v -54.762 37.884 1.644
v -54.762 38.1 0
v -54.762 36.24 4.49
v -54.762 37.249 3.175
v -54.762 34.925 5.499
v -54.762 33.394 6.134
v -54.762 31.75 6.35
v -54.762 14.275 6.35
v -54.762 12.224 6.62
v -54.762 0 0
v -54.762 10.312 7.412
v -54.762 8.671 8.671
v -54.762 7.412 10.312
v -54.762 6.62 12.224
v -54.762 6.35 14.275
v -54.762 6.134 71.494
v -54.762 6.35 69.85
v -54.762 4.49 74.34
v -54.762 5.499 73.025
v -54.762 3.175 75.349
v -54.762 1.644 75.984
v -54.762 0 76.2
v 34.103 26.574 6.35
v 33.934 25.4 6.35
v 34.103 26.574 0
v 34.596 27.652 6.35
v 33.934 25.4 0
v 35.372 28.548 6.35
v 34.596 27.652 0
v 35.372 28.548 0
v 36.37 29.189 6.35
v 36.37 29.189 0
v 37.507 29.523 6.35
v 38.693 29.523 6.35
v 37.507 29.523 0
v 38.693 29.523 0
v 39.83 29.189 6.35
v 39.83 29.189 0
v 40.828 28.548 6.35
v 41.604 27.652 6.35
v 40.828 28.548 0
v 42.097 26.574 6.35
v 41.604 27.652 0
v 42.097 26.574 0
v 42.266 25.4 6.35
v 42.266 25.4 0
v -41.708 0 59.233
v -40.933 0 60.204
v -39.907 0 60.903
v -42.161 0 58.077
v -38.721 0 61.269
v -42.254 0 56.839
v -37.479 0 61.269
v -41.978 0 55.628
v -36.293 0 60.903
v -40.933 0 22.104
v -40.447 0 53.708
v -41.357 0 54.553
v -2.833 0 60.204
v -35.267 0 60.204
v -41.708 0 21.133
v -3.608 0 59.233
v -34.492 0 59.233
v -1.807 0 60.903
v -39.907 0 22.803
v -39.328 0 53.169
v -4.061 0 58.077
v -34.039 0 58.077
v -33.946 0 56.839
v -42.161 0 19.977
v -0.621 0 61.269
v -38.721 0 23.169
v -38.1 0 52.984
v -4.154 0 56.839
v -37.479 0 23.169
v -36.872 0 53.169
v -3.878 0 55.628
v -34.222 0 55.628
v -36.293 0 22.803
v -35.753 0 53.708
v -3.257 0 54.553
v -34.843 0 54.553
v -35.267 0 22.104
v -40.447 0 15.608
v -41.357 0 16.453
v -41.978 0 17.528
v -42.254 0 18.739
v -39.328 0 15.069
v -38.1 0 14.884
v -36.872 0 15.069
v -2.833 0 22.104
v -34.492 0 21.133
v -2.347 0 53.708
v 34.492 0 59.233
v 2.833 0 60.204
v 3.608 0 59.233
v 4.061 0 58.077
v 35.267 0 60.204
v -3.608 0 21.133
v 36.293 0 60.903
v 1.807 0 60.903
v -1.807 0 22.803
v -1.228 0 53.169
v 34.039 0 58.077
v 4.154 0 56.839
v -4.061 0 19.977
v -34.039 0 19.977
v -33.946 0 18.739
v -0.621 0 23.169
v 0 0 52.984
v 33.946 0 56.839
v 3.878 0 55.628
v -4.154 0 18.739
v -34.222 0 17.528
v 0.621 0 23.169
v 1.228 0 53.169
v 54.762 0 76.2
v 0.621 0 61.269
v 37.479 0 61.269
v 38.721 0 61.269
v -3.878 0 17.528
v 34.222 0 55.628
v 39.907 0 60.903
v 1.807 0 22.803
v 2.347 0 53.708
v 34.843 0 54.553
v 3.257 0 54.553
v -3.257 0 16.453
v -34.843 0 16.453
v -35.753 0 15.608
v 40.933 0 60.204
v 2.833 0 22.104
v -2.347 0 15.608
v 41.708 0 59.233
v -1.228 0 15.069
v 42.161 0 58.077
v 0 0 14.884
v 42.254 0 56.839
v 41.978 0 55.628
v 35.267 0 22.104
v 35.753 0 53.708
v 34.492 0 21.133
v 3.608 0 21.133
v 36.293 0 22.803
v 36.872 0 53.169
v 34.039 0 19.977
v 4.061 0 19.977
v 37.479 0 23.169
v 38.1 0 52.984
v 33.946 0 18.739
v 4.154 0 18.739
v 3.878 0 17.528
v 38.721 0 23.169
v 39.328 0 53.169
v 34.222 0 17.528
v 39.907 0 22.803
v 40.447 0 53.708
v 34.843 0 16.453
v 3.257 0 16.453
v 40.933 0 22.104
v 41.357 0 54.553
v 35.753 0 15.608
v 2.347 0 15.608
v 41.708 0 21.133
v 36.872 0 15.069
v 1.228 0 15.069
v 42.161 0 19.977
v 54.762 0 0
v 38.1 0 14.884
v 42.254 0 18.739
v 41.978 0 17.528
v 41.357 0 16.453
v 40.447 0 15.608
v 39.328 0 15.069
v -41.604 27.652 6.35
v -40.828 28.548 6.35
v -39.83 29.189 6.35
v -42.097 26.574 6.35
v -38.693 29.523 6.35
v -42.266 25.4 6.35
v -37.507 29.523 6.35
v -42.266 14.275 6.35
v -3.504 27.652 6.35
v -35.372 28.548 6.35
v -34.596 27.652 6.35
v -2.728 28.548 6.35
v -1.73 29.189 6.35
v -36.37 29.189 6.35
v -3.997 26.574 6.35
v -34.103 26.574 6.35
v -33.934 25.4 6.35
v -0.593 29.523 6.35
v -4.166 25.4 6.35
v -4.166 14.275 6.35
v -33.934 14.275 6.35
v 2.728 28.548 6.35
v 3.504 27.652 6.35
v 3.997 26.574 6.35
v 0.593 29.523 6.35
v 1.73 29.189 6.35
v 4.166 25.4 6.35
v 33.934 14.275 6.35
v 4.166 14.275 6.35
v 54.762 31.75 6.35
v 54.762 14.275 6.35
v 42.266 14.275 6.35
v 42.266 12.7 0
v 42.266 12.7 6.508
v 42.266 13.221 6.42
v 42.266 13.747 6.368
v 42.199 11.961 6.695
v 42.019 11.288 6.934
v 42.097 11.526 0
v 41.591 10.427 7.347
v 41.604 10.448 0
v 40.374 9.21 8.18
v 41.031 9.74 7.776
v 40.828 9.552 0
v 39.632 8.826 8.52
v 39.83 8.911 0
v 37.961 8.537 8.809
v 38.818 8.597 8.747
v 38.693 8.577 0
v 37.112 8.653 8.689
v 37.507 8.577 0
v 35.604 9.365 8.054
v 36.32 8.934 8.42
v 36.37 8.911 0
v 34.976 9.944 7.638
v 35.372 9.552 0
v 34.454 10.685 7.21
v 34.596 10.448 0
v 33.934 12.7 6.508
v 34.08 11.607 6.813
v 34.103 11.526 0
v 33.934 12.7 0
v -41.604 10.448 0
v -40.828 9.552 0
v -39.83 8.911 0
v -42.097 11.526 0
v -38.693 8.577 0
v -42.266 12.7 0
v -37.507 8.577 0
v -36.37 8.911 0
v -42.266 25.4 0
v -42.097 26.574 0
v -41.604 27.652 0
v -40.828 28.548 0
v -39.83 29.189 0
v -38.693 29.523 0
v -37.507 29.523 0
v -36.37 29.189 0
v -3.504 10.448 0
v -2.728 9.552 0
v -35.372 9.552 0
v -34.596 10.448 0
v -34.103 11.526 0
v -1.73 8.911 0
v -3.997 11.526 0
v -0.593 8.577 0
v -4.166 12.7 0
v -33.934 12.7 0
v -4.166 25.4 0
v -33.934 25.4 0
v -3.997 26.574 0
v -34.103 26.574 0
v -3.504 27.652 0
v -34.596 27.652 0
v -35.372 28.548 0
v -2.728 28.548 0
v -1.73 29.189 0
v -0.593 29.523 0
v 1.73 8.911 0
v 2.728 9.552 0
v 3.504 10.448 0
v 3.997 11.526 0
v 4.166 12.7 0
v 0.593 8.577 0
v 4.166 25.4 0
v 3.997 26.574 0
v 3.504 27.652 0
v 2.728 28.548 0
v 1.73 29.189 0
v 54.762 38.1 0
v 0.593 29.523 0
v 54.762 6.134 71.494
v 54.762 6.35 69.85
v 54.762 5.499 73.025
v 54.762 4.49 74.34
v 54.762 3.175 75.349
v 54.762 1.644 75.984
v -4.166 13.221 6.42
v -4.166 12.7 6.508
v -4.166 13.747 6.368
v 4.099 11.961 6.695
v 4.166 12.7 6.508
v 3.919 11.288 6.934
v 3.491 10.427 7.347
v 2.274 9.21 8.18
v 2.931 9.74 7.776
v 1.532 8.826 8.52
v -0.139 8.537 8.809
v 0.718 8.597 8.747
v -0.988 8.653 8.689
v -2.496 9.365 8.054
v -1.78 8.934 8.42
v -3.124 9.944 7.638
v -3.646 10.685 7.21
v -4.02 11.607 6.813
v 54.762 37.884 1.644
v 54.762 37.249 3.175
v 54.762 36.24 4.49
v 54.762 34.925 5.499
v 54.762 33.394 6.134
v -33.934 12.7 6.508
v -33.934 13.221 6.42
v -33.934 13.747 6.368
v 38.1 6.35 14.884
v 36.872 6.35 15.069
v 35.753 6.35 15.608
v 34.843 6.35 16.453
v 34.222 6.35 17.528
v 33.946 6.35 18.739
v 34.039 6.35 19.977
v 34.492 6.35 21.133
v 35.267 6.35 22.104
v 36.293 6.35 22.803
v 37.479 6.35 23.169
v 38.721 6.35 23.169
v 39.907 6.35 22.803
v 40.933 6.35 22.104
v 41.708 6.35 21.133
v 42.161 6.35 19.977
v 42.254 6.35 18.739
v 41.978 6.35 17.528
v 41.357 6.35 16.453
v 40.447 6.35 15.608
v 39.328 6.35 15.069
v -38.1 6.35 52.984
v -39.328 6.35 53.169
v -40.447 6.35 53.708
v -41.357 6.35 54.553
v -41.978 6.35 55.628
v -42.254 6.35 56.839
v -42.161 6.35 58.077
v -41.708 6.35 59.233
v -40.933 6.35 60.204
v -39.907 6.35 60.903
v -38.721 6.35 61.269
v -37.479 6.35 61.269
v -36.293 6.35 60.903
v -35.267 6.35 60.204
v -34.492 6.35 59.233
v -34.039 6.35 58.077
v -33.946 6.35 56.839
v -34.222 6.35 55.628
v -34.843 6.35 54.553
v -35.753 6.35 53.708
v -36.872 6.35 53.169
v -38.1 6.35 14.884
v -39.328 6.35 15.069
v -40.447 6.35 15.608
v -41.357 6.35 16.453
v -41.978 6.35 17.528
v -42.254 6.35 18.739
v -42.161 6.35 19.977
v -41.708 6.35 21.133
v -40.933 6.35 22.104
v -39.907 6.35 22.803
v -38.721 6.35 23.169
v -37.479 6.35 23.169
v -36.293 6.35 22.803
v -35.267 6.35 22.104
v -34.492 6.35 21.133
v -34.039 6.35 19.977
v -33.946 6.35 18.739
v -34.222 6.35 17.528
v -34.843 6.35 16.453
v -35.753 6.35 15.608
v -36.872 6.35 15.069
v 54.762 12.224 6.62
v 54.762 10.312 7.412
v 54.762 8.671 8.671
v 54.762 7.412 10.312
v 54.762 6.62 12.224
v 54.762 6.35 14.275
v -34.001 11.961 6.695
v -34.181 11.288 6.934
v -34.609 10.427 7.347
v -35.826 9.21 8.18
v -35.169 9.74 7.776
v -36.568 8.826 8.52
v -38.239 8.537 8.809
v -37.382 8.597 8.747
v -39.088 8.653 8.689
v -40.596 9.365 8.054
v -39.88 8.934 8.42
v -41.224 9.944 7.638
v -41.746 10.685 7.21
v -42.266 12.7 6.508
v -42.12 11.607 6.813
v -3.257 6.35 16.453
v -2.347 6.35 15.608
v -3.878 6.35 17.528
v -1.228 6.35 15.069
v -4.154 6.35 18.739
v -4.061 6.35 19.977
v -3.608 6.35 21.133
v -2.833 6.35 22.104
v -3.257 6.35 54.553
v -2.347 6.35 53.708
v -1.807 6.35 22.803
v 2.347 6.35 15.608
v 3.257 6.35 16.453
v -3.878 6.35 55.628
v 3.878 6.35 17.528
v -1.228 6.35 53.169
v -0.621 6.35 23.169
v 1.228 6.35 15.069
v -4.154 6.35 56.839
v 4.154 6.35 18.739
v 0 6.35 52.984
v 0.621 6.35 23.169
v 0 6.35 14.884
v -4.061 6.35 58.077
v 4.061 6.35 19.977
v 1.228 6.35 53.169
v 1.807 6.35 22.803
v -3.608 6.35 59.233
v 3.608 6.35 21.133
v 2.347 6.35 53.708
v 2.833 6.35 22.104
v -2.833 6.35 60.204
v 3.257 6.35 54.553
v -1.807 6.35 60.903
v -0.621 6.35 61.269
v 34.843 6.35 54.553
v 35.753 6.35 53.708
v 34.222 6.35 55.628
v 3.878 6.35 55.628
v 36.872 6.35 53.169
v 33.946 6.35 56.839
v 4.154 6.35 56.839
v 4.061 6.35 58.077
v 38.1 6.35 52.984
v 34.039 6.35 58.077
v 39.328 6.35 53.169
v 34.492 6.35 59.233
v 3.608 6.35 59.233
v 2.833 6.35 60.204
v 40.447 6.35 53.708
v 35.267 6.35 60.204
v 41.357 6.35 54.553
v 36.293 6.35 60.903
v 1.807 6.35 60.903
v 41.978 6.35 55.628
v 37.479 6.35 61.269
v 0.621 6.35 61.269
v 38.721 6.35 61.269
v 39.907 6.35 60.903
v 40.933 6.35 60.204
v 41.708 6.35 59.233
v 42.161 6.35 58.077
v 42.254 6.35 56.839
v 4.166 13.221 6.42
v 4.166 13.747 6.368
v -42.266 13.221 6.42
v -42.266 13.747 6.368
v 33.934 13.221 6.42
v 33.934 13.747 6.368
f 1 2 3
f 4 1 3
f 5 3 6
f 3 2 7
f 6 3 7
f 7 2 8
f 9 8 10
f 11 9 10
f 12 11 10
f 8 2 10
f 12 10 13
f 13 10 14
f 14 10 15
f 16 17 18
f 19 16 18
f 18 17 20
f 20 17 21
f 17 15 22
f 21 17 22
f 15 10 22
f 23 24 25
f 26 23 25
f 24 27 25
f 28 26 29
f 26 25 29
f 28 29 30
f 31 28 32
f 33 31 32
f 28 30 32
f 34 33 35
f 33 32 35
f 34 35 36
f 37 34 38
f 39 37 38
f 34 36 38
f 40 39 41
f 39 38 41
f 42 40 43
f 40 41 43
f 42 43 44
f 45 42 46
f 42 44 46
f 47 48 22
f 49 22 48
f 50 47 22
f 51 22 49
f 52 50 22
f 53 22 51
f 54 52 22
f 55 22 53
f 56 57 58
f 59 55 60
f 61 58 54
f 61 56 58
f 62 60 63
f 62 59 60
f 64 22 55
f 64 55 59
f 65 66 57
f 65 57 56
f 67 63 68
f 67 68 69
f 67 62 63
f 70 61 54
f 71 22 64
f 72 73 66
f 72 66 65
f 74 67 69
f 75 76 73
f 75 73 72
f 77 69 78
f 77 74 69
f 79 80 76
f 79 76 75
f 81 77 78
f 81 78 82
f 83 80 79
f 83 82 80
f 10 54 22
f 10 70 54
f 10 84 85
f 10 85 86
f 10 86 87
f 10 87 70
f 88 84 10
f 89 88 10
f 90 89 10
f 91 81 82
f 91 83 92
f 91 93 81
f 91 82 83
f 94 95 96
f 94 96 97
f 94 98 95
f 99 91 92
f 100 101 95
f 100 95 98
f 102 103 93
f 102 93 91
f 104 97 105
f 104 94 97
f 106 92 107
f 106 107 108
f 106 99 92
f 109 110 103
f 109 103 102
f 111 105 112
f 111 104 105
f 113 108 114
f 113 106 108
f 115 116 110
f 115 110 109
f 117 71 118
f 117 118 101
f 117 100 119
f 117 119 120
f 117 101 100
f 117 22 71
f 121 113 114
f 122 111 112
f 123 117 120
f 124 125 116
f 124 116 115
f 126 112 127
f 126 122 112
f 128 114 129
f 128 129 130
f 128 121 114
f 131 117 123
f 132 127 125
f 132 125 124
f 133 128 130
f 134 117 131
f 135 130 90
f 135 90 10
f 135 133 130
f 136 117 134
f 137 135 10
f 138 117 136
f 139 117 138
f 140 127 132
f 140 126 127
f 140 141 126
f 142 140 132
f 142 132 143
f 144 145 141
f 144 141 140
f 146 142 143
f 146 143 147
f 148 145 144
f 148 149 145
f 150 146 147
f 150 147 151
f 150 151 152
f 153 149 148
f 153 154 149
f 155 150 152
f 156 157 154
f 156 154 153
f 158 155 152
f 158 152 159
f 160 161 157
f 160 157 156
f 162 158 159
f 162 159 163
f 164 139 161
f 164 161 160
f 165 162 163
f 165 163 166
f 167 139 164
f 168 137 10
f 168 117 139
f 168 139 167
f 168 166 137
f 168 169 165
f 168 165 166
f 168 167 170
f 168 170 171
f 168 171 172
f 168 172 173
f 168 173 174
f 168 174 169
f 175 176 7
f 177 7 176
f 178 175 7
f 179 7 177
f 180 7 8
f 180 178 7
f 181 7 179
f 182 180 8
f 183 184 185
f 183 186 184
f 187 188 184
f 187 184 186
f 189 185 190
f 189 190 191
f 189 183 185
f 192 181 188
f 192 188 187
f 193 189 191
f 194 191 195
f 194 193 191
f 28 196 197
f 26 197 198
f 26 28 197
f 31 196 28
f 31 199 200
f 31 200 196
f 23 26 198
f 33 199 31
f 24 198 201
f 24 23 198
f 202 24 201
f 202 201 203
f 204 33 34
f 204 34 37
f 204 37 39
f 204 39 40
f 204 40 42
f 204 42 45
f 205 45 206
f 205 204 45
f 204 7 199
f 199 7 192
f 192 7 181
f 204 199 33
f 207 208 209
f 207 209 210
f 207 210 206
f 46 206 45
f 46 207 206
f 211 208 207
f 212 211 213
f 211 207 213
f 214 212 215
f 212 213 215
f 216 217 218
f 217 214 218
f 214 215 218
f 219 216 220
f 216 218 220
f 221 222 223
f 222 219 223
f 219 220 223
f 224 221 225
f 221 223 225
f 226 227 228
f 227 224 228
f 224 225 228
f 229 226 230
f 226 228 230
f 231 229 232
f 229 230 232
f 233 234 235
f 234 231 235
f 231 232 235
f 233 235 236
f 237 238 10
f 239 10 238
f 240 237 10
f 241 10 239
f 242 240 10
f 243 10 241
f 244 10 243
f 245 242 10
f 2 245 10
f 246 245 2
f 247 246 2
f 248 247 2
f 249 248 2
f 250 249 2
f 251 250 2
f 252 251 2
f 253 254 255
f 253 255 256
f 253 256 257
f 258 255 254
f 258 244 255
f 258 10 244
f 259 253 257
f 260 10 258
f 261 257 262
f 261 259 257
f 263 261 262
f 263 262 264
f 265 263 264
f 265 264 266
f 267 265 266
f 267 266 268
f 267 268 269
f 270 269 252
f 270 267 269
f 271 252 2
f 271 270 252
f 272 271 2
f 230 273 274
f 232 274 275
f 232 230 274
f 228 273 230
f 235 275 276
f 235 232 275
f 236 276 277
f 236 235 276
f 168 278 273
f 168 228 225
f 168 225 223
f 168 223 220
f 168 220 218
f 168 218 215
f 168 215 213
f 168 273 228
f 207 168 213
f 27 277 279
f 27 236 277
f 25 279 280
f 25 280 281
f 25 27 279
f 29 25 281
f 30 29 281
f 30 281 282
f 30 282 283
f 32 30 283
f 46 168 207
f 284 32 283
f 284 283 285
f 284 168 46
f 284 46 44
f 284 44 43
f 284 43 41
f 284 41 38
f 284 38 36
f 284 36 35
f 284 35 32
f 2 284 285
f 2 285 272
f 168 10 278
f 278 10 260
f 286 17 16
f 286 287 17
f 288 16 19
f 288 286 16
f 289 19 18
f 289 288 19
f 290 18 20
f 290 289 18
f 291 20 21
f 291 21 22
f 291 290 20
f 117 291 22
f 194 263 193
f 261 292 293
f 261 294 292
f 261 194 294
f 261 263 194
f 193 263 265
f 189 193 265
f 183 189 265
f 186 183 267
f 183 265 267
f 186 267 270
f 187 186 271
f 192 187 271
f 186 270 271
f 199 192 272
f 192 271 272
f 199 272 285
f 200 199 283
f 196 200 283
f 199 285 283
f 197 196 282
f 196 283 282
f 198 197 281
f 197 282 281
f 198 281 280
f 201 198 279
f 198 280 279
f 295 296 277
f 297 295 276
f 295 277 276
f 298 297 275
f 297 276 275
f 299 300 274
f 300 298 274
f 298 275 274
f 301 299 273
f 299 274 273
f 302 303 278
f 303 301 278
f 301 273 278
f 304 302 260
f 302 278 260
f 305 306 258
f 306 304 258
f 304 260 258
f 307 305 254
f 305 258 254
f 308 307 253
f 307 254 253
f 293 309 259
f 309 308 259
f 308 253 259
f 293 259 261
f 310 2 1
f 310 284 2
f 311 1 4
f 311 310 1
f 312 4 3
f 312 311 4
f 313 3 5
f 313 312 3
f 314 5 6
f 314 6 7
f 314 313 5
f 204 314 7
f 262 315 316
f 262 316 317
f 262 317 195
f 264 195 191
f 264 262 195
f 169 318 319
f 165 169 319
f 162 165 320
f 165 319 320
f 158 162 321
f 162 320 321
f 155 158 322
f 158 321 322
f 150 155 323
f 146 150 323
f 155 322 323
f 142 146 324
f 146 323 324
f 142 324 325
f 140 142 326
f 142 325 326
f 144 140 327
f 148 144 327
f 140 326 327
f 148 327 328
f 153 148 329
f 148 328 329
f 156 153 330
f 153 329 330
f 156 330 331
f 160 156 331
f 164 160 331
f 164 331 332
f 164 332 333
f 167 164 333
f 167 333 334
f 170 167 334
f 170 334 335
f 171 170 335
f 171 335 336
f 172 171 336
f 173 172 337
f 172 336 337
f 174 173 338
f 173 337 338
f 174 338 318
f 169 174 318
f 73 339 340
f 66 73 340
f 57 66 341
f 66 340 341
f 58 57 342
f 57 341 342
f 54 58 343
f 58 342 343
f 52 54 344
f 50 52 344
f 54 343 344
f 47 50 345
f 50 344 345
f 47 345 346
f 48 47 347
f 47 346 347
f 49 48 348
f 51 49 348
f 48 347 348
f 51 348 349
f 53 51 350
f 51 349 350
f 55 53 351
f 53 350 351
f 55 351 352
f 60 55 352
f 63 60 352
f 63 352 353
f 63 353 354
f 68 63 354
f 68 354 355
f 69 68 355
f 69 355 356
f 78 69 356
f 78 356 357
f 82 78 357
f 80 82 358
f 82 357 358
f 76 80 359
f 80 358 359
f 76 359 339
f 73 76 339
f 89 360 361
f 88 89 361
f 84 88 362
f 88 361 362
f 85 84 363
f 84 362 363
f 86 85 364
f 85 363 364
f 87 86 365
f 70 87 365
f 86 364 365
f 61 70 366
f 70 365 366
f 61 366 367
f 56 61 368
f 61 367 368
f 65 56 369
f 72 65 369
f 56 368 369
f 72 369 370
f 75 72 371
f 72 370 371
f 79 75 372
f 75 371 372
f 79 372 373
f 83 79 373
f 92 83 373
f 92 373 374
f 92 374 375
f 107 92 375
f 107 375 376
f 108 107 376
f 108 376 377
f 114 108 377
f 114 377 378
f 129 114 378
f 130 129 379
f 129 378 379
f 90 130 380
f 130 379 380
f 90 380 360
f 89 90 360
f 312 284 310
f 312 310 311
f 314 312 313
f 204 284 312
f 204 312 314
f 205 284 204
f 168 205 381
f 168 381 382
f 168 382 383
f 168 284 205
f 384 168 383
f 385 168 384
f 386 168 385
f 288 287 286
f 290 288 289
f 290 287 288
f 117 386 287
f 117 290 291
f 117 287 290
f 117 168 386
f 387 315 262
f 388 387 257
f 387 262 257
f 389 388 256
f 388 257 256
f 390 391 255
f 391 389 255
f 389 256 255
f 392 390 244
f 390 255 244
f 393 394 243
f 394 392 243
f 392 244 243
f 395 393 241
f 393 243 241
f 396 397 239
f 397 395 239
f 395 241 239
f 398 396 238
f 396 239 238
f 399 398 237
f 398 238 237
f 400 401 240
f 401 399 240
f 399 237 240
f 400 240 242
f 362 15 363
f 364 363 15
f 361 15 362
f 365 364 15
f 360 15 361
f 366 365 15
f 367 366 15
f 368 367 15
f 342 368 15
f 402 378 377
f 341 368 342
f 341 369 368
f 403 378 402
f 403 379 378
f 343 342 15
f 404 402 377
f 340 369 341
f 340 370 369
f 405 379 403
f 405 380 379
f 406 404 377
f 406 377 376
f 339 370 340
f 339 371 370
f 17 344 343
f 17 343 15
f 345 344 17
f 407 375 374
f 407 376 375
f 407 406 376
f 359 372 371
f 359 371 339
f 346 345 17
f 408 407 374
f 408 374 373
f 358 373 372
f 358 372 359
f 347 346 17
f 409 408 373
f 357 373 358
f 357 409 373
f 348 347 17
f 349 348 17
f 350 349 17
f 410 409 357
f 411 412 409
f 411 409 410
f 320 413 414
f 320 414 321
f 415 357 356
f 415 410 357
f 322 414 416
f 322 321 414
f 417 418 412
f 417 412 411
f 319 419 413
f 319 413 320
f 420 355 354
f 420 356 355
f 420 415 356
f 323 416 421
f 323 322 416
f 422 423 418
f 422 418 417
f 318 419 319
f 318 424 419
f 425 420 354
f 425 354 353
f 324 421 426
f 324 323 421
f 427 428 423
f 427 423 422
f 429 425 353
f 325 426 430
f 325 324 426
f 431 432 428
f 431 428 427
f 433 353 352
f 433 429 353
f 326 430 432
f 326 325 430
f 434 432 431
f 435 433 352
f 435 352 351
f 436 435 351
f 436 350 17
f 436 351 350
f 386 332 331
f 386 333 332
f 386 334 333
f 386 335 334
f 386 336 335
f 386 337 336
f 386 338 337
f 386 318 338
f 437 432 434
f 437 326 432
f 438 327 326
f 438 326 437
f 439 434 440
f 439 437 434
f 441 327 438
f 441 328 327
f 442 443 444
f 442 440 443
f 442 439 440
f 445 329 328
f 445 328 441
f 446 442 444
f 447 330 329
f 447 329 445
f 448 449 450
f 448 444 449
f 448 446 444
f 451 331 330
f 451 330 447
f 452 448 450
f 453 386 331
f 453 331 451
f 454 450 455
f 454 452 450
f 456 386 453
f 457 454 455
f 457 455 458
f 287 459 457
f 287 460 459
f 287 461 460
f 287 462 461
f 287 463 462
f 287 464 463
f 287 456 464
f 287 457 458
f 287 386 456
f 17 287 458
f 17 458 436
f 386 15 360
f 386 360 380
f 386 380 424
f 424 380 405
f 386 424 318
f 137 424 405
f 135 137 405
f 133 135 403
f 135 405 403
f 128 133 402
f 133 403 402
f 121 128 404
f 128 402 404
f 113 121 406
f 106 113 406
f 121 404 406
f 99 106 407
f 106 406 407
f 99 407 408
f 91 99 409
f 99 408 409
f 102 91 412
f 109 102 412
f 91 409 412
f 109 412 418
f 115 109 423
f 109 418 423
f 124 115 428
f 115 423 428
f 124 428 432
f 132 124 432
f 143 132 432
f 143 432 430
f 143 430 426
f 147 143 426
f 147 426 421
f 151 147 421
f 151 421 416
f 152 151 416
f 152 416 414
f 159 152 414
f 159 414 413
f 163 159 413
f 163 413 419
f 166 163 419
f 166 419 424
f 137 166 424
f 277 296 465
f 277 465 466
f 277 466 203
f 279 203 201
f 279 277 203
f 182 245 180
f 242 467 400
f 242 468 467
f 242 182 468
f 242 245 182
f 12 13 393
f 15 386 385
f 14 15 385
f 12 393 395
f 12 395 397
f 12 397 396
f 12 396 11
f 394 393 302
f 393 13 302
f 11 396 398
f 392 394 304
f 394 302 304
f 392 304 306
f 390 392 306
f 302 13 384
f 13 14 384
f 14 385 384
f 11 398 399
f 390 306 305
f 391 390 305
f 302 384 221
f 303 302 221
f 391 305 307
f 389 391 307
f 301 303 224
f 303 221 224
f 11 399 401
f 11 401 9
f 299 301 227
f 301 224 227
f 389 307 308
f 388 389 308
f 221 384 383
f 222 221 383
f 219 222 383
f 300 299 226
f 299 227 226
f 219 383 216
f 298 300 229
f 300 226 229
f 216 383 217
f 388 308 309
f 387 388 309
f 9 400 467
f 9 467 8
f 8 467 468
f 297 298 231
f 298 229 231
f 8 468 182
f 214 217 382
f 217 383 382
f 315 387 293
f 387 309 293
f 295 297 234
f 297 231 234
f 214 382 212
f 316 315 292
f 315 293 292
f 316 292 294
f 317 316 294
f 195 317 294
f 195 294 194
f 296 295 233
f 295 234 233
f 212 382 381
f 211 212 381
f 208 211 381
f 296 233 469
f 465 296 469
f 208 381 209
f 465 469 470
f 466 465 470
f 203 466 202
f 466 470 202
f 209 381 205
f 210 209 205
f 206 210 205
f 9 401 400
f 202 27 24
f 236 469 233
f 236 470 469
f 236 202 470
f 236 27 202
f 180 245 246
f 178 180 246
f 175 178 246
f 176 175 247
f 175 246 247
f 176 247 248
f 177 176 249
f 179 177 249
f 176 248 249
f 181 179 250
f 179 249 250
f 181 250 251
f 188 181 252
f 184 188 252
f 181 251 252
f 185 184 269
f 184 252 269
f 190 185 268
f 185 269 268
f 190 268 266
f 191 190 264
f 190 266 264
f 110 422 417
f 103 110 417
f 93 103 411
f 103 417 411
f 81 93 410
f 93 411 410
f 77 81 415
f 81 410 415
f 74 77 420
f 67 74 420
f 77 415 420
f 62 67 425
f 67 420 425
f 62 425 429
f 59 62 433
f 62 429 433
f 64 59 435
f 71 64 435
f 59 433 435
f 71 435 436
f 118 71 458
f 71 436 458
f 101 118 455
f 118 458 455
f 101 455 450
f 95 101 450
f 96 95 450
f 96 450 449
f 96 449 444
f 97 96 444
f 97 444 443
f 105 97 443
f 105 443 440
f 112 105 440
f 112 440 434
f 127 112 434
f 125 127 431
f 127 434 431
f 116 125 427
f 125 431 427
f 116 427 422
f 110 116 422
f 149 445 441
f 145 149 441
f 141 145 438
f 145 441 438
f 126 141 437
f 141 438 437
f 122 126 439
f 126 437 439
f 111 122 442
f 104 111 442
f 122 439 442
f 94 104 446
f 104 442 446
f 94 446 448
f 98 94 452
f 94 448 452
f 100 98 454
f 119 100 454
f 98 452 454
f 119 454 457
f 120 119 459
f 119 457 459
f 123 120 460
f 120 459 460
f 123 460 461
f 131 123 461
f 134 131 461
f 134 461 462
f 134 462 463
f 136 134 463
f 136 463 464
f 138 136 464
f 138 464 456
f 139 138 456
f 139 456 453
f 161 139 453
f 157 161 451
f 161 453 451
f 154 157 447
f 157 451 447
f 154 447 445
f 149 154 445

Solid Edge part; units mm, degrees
sketch "Sketch1" plane through (0, 0, 0) normal (1, 0, 0) x (0, 1, 0)
  line L0 (0, 76.2) -> (0, 0)
  line L1 (0, 0) -> (38.1, 0)
  arc A0 (38.1, 0) -> (31.75, 6.35) centre (31.75, 0) ccw
  line L2 (31.75, 6.35) -> (14.2748, 6.35)
  arc A1 (14.2748, 6.35) -> (6.35, 14.2748) centre (14.2748, 14.2748) cw
  line L3 (6.35, 14.2748) -> (6.35, 69.85)
  arc A2 (6.35, 69.85) -> (0, 76.2) centre (0, 69.85) ccw
extrude "ExtrudedProtrusion_1" add sketch "Sketch1" against normal blind 54.7624 and the other way blind 54.7624
hole "Hole_1" at (38.1, 0, 19.05) direction (0, 1, 0) diameter 8.3312 depth 6.985
hole "Hole_2" at (0, 0, 19.05) direction (0, 1, 0) diameter 8.3312 depth 6.985
hole "Hole_3" at (-38.1, 0, 19.05) direction (0, 1, 0) diameter 8.3312 depth 6.985
hole "Hole_4" at (38.1, 0, 57.15) direction (0, 1, 0) diameter 8.3312 depth 6.985
hole "Hole_5" at (0, 0, 57.15) direction (0, 1, 0) diameter 8.3312 depth 6.985
hole "Hole_6" at (-38.1, 0, 57.15) direction (0, 1, 0) diameter 8.3312 depth 6.985
sketch "Sketch2" plane through (0, 0, 0) normal (0, 0, 1) x (1, 0, 0)
  arc A0 (33.9344, 12.7) -> (42.2656, 12.7) centre (38.1, 12.7) ccw
  line L0 (42.2656, 12.7) -> (42.2656, 25.4)
  arc A1 (42.2656, 25.4) -> (33.9344, 25.4) centre (38.1, 25.4) ccw
  line L1 (33.9344, 25.4) -> (33.9344, 12.7)
extrude "ExtrudedCutout_1" cut sketch "Sketch2" along normal blind 9.525
sketch "Sketch3" plane through (0, 0, 0) normal (0, 0, 1) x (1, 0, 0)
  arc A0 (-4.1656, 12.7) -> (4.1656, 12.7) centre (0, 12.7) ccw
  line L0 (4.1656, 12.7) -> (4.1656, 25.4)
  arc A1 (4.1656, 25.4) -> (-4.1656, 25.4) centre (0, 25.4) ccw
  line L1 (-4.1656, 25.4) -> (-4.1656, 12.7)
extrude "ExtrudedCutout_2" cut sketch "Sketch3" along normal blind 9.525
sketch "Sketch4" plane through (0, 0, 0) normal (0, 0, 1) x (1, 0, 0)
  arc A0 (-42.2656, 12.7) -> (-33.9344, 12.7) centre (-38.1, 12.7) ccw
  line L0 (-33.9344, 12.7) -> (-33.9344, 25.4)
  arc A1 (-33.9344, 25.4) -> (-42.2656, 25.4) centre (-38.1, 25.4) ccw
  line L1 (-42.2656, 25.4) -> (-42.2656, 12.7)
extrude "ExtrudedCutout_3" cut sketch "Sketch4" along normal blind 9.525
properties part number "4281"
